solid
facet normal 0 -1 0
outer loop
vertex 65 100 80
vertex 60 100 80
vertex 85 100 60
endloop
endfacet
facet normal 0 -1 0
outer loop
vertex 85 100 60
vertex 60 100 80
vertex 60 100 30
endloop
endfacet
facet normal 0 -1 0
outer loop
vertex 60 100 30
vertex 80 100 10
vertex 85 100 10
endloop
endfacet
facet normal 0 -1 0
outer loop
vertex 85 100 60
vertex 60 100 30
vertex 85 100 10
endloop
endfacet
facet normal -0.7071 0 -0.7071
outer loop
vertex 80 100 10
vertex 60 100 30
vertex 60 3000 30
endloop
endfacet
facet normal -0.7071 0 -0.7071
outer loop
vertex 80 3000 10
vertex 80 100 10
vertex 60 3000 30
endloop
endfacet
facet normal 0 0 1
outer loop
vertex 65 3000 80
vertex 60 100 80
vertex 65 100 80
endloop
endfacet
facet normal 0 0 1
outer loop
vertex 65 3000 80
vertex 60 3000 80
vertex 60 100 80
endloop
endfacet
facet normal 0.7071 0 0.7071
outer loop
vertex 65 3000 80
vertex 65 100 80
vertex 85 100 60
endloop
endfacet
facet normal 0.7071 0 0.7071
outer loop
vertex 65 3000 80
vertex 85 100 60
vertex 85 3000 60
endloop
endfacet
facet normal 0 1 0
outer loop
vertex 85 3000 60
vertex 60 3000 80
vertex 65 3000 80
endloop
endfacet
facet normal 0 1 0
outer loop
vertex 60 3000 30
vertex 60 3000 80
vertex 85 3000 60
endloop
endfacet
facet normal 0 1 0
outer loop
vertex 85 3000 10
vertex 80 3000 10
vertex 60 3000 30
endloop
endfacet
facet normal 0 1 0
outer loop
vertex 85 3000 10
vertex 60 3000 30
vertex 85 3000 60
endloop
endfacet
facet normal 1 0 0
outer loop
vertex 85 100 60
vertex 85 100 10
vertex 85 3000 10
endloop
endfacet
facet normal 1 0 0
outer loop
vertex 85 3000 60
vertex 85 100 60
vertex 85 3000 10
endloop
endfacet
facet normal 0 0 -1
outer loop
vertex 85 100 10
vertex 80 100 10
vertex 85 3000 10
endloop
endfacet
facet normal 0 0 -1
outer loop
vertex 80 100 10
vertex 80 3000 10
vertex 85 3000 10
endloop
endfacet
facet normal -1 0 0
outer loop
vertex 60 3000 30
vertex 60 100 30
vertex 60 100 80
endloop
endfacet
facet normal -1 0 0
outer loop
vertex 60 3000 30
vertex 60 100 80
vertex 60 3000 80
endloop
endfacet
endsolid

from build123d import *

# Parameters (mm, degrees)
BOX003_W        = 25
BOX003_H        = 2900
BOX003_DEPTH    = 70
CHAMFER_SIZE    = 20
CHAMFER001_SIZE = 20


with BuildPart() as part:
    # Box003 → Box003 (new body)
    with BuildSketch(Plane(origin=(200, 0, 0), x_dir=(1, 0, 0), z_dir=(0, 0, 1))):
        with Locations((12.5, 1450)):
            Rectangle(BOX003_W, BOX003_H)
    extrude(amount=BOX003_DEPTH)

    # Chamfer
    chamfer_edges = [part.edges().sort_by_distance(p)[0] for p in [
        (225, 1450, 70),
    ]]
    chamfer(chamfer_edges, length=CHAMFER_SIZE)

    # Chamfer001
    chamfer001_edges = [part.edges().sort_by_distance(p)[0] for p in [
        (200, 1450, 0),
    ]]
    chamfer(chamfer001_edges, length=CHAMFER001_SIZE)


with BuildPart() as part_1:
    # Chamfer001 placement: moved
    add(part.part.moved(Location((-140, 100, 10))))


solid = part_1.part
